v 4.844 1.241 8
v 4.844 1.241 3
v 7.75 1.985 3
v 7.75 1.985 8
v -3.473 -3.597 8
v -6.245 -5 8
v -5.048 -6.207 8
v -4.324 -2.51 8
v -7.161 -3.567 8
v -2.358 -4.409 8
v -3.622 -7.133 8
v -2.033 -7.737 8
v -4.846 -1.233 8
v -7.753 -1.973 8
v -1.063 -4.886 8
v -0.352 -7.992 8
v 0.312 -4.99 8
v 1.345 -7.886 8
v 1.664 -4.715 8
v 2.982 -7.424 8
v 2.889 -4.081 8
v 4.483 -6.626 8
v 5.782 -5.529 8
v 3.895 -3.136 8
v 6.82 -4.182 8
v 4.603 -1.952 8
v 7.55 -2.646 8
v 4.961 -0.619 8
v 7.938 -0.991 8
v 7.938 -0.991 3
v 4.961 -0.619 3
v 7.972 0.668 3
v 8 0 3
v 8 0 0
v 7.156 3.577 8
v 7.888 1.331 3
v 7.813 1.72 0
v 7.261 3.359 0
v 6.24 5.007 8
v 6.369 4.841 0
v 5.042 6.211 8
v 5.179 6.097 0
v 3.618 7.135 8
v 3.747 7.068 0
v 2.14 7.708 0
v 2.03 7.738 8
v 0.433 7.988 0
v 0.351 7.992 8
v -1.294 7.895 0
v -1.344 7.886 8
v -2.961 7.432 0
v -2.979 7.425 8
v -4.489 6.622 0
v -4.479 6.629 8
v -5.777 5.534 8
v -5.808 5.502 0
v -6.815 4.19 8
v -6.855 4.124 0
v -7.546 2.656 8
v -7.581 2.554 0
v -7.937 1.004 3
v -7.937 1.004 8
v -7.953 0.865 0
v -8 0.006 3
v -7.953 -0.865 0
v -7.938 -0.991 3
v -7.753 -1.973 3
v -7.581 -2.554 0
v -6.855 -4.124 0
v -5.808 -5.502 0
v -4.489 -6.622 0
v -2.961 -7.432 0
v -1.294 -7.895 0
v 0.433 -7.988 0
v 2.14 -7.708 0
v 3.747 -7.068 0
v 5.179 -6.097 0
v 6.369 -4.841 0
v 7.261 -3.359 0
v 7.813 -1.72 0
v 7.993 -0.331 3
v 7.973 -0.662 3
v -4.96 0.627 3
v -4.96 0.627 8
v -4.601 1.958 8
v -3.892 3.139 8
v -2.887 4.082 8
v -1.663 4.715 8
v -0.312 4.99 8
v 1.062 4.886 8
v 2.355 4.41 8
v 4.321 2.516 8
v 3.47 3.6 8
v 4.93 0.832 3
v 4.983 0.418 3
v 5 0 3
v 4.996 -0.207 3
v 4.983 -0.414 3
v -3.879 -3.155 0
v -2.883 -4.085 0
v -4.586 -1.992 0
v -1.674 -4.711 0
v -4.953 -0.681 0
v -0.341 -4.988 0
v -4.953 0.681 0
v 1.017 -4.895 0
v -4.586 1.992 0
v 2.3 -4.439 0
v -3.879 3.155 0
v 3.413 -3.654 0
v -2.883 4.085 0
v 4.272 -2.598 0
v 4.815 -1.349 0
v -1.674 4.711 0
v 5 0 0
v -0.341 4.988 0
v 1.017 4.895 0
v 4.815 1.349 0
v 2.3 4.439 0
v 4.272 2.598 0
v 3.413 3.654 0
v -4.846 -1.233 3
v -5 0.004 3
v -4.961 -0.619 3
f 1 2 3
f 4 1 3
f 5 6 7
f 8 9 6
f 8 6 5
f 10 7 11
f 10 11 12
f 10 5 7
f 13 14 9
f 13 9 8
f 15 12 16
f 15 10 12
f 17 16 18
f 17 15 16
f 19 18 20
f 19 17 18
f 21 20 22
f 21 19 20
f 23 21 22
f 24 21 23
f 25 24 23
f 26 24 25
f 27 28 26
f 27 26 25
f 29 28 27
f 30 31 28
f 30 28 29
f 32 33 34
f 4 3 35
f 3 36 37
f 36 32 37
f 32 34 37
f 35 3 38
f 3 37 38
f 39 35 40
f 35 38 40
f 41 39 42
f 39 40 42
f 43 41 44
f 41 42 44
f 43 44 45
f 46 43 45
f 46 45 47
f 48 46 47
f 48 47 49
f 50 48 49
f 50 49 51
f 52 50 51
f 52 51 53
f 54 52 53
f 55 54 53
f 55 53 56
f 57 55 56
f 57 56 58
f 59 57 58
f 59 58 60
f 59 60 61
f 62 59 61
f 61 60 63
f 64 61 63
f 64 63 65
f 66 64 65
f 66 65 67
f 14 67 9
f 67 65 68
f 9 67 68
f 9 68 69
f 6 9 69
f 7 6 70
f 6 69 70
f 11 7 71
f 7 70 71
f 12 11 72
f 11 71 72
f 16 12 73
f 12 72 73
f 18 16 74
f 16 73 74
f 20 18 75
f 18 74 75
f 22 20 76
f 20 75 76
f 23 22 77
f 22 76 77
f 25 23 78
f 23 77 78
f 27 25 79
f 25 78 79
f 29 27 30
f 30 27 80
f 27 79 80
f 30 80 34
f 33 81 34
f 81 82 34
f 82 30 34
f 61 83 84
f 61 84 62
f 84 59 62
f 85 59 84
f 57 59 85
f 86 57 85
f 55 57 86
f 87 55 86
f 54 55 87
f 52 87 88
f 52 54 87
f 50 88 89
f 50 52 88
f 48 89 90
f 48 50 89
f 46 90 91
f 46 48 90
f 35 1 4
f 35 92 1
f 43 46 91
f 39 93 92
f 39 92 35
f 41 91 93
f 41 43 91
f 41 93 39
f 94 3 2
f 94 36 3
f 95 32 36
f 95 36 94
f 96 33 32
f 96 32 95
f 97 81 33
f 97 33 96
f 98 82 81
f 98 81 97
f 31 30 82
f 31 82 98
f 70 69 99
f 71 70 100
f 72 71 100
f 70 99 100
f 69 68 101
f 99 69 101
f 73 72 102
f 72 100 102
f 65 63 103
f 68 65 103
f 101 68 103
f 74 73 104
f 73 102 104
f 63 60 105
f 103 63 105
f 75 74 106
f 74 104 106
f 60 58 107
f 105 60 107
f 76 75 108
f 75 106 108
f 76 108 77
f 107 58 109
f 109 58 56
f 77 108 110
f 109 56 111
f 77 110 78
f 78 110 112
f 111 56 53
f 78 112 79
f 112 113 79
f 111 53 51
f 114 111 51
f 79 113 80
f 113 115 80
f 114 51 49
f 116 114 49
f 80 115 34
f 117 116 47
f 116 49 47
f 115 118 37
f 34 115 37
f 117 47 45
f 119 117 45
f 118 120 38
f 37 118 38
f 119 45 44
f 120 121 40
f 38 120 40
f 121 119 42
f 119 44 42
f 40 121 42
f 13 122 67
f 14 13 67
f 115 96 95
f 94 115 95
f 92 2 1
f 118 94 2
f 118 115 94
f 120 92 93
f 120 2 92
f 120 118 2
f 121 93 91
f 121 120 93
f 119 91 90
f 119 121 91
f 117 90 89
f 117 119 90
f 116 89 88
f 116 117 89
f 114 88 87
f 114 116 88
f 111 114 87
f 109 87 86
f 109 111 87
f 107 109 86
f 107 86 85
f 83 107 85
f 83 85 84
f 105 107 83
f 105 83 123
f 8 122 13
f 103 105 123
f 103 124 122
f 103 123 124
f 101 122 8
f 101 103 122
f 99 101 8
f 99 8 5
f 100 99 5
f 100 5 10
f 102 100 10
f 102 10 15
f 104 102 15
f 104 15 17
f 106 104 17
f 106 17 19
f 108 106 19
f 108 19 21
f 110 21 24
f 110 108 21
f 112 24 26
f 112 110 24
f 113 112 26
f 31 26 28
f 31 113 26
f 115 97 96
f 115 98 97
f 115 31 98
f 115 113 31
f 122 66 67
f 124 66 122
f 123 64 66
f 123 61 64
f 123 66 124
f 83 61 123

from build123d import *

# Parameters (mm, degrees)
SKETCH1_R                = 8
SKETCH1_R_2              = 5
BOSS_EXTRUDE1_DEPTH      = 8
WRAP2_SECTION_W          = 4
WRAP2_SECTION_H          = 5
WRAP2_ANGLE              = 21.485917317
WRAP2_SECTOR_2_SECTION_W = 4
WRAP2_SECTOR_2_SECTION_H = 5
WRAP2_SECTOR_2_ANGLE     = 21.485917317


with BuildPart() as part:
    # Sketch1 → Boss-Extrude1 (new body)
    with BuildSketch(Plane.XY):
        Circle(SKETCH1_R)
        Circle(SKETCH1_R_2, mode=Mode.SUBTRACT)
    extrude(amount=BOSS_EXTRUDE1_DEPTH)

    # Wrap2 section (on wrap section) → Wrap2 (revolve, cut)
    with BuildSketch(Plane(origin=(0, 0, 0), x_dir=(-0.9691091288804563, -0.24663230996883403, 0), z_dir=(0.24663230996883403, -0.9691091288804563, 0))):
        with Locations((6, -5.5)):
            Rectangle(WRAP2_SECTION_W, WRAP2_SECTION_H)
    revolve(axis=Axis((0, 0, 0), (0, 0, -1)), revolution_arc=WRAP2_ANGLE, mode=Mode.SUBTRACT)

    # Wrap2 sector 2 section (on wrap section) → Wrap2 sector 2 (revolve, cut)
    with BuildSketch(Plane(origin=(0, 0, 0), x_dir=(0.9687151001182653, 0.24817545165237268, 0), z_dir=(-0.24817545165237268, 0.9687151001182653, 0))):
        with Locations((6, -5.5)):
            Rectangle(WRAP2_SECTOR_2_SECTION_W, WRAP2_SECTOR_2_SECTION_H)
    revolve(axis=Axis((0, 0, 0), (0, 0, -1)), revolution_arc=WRAP2_SECTOR_2_ANGLE, mode=Mode.SUBTRACT)


solid = part.part
